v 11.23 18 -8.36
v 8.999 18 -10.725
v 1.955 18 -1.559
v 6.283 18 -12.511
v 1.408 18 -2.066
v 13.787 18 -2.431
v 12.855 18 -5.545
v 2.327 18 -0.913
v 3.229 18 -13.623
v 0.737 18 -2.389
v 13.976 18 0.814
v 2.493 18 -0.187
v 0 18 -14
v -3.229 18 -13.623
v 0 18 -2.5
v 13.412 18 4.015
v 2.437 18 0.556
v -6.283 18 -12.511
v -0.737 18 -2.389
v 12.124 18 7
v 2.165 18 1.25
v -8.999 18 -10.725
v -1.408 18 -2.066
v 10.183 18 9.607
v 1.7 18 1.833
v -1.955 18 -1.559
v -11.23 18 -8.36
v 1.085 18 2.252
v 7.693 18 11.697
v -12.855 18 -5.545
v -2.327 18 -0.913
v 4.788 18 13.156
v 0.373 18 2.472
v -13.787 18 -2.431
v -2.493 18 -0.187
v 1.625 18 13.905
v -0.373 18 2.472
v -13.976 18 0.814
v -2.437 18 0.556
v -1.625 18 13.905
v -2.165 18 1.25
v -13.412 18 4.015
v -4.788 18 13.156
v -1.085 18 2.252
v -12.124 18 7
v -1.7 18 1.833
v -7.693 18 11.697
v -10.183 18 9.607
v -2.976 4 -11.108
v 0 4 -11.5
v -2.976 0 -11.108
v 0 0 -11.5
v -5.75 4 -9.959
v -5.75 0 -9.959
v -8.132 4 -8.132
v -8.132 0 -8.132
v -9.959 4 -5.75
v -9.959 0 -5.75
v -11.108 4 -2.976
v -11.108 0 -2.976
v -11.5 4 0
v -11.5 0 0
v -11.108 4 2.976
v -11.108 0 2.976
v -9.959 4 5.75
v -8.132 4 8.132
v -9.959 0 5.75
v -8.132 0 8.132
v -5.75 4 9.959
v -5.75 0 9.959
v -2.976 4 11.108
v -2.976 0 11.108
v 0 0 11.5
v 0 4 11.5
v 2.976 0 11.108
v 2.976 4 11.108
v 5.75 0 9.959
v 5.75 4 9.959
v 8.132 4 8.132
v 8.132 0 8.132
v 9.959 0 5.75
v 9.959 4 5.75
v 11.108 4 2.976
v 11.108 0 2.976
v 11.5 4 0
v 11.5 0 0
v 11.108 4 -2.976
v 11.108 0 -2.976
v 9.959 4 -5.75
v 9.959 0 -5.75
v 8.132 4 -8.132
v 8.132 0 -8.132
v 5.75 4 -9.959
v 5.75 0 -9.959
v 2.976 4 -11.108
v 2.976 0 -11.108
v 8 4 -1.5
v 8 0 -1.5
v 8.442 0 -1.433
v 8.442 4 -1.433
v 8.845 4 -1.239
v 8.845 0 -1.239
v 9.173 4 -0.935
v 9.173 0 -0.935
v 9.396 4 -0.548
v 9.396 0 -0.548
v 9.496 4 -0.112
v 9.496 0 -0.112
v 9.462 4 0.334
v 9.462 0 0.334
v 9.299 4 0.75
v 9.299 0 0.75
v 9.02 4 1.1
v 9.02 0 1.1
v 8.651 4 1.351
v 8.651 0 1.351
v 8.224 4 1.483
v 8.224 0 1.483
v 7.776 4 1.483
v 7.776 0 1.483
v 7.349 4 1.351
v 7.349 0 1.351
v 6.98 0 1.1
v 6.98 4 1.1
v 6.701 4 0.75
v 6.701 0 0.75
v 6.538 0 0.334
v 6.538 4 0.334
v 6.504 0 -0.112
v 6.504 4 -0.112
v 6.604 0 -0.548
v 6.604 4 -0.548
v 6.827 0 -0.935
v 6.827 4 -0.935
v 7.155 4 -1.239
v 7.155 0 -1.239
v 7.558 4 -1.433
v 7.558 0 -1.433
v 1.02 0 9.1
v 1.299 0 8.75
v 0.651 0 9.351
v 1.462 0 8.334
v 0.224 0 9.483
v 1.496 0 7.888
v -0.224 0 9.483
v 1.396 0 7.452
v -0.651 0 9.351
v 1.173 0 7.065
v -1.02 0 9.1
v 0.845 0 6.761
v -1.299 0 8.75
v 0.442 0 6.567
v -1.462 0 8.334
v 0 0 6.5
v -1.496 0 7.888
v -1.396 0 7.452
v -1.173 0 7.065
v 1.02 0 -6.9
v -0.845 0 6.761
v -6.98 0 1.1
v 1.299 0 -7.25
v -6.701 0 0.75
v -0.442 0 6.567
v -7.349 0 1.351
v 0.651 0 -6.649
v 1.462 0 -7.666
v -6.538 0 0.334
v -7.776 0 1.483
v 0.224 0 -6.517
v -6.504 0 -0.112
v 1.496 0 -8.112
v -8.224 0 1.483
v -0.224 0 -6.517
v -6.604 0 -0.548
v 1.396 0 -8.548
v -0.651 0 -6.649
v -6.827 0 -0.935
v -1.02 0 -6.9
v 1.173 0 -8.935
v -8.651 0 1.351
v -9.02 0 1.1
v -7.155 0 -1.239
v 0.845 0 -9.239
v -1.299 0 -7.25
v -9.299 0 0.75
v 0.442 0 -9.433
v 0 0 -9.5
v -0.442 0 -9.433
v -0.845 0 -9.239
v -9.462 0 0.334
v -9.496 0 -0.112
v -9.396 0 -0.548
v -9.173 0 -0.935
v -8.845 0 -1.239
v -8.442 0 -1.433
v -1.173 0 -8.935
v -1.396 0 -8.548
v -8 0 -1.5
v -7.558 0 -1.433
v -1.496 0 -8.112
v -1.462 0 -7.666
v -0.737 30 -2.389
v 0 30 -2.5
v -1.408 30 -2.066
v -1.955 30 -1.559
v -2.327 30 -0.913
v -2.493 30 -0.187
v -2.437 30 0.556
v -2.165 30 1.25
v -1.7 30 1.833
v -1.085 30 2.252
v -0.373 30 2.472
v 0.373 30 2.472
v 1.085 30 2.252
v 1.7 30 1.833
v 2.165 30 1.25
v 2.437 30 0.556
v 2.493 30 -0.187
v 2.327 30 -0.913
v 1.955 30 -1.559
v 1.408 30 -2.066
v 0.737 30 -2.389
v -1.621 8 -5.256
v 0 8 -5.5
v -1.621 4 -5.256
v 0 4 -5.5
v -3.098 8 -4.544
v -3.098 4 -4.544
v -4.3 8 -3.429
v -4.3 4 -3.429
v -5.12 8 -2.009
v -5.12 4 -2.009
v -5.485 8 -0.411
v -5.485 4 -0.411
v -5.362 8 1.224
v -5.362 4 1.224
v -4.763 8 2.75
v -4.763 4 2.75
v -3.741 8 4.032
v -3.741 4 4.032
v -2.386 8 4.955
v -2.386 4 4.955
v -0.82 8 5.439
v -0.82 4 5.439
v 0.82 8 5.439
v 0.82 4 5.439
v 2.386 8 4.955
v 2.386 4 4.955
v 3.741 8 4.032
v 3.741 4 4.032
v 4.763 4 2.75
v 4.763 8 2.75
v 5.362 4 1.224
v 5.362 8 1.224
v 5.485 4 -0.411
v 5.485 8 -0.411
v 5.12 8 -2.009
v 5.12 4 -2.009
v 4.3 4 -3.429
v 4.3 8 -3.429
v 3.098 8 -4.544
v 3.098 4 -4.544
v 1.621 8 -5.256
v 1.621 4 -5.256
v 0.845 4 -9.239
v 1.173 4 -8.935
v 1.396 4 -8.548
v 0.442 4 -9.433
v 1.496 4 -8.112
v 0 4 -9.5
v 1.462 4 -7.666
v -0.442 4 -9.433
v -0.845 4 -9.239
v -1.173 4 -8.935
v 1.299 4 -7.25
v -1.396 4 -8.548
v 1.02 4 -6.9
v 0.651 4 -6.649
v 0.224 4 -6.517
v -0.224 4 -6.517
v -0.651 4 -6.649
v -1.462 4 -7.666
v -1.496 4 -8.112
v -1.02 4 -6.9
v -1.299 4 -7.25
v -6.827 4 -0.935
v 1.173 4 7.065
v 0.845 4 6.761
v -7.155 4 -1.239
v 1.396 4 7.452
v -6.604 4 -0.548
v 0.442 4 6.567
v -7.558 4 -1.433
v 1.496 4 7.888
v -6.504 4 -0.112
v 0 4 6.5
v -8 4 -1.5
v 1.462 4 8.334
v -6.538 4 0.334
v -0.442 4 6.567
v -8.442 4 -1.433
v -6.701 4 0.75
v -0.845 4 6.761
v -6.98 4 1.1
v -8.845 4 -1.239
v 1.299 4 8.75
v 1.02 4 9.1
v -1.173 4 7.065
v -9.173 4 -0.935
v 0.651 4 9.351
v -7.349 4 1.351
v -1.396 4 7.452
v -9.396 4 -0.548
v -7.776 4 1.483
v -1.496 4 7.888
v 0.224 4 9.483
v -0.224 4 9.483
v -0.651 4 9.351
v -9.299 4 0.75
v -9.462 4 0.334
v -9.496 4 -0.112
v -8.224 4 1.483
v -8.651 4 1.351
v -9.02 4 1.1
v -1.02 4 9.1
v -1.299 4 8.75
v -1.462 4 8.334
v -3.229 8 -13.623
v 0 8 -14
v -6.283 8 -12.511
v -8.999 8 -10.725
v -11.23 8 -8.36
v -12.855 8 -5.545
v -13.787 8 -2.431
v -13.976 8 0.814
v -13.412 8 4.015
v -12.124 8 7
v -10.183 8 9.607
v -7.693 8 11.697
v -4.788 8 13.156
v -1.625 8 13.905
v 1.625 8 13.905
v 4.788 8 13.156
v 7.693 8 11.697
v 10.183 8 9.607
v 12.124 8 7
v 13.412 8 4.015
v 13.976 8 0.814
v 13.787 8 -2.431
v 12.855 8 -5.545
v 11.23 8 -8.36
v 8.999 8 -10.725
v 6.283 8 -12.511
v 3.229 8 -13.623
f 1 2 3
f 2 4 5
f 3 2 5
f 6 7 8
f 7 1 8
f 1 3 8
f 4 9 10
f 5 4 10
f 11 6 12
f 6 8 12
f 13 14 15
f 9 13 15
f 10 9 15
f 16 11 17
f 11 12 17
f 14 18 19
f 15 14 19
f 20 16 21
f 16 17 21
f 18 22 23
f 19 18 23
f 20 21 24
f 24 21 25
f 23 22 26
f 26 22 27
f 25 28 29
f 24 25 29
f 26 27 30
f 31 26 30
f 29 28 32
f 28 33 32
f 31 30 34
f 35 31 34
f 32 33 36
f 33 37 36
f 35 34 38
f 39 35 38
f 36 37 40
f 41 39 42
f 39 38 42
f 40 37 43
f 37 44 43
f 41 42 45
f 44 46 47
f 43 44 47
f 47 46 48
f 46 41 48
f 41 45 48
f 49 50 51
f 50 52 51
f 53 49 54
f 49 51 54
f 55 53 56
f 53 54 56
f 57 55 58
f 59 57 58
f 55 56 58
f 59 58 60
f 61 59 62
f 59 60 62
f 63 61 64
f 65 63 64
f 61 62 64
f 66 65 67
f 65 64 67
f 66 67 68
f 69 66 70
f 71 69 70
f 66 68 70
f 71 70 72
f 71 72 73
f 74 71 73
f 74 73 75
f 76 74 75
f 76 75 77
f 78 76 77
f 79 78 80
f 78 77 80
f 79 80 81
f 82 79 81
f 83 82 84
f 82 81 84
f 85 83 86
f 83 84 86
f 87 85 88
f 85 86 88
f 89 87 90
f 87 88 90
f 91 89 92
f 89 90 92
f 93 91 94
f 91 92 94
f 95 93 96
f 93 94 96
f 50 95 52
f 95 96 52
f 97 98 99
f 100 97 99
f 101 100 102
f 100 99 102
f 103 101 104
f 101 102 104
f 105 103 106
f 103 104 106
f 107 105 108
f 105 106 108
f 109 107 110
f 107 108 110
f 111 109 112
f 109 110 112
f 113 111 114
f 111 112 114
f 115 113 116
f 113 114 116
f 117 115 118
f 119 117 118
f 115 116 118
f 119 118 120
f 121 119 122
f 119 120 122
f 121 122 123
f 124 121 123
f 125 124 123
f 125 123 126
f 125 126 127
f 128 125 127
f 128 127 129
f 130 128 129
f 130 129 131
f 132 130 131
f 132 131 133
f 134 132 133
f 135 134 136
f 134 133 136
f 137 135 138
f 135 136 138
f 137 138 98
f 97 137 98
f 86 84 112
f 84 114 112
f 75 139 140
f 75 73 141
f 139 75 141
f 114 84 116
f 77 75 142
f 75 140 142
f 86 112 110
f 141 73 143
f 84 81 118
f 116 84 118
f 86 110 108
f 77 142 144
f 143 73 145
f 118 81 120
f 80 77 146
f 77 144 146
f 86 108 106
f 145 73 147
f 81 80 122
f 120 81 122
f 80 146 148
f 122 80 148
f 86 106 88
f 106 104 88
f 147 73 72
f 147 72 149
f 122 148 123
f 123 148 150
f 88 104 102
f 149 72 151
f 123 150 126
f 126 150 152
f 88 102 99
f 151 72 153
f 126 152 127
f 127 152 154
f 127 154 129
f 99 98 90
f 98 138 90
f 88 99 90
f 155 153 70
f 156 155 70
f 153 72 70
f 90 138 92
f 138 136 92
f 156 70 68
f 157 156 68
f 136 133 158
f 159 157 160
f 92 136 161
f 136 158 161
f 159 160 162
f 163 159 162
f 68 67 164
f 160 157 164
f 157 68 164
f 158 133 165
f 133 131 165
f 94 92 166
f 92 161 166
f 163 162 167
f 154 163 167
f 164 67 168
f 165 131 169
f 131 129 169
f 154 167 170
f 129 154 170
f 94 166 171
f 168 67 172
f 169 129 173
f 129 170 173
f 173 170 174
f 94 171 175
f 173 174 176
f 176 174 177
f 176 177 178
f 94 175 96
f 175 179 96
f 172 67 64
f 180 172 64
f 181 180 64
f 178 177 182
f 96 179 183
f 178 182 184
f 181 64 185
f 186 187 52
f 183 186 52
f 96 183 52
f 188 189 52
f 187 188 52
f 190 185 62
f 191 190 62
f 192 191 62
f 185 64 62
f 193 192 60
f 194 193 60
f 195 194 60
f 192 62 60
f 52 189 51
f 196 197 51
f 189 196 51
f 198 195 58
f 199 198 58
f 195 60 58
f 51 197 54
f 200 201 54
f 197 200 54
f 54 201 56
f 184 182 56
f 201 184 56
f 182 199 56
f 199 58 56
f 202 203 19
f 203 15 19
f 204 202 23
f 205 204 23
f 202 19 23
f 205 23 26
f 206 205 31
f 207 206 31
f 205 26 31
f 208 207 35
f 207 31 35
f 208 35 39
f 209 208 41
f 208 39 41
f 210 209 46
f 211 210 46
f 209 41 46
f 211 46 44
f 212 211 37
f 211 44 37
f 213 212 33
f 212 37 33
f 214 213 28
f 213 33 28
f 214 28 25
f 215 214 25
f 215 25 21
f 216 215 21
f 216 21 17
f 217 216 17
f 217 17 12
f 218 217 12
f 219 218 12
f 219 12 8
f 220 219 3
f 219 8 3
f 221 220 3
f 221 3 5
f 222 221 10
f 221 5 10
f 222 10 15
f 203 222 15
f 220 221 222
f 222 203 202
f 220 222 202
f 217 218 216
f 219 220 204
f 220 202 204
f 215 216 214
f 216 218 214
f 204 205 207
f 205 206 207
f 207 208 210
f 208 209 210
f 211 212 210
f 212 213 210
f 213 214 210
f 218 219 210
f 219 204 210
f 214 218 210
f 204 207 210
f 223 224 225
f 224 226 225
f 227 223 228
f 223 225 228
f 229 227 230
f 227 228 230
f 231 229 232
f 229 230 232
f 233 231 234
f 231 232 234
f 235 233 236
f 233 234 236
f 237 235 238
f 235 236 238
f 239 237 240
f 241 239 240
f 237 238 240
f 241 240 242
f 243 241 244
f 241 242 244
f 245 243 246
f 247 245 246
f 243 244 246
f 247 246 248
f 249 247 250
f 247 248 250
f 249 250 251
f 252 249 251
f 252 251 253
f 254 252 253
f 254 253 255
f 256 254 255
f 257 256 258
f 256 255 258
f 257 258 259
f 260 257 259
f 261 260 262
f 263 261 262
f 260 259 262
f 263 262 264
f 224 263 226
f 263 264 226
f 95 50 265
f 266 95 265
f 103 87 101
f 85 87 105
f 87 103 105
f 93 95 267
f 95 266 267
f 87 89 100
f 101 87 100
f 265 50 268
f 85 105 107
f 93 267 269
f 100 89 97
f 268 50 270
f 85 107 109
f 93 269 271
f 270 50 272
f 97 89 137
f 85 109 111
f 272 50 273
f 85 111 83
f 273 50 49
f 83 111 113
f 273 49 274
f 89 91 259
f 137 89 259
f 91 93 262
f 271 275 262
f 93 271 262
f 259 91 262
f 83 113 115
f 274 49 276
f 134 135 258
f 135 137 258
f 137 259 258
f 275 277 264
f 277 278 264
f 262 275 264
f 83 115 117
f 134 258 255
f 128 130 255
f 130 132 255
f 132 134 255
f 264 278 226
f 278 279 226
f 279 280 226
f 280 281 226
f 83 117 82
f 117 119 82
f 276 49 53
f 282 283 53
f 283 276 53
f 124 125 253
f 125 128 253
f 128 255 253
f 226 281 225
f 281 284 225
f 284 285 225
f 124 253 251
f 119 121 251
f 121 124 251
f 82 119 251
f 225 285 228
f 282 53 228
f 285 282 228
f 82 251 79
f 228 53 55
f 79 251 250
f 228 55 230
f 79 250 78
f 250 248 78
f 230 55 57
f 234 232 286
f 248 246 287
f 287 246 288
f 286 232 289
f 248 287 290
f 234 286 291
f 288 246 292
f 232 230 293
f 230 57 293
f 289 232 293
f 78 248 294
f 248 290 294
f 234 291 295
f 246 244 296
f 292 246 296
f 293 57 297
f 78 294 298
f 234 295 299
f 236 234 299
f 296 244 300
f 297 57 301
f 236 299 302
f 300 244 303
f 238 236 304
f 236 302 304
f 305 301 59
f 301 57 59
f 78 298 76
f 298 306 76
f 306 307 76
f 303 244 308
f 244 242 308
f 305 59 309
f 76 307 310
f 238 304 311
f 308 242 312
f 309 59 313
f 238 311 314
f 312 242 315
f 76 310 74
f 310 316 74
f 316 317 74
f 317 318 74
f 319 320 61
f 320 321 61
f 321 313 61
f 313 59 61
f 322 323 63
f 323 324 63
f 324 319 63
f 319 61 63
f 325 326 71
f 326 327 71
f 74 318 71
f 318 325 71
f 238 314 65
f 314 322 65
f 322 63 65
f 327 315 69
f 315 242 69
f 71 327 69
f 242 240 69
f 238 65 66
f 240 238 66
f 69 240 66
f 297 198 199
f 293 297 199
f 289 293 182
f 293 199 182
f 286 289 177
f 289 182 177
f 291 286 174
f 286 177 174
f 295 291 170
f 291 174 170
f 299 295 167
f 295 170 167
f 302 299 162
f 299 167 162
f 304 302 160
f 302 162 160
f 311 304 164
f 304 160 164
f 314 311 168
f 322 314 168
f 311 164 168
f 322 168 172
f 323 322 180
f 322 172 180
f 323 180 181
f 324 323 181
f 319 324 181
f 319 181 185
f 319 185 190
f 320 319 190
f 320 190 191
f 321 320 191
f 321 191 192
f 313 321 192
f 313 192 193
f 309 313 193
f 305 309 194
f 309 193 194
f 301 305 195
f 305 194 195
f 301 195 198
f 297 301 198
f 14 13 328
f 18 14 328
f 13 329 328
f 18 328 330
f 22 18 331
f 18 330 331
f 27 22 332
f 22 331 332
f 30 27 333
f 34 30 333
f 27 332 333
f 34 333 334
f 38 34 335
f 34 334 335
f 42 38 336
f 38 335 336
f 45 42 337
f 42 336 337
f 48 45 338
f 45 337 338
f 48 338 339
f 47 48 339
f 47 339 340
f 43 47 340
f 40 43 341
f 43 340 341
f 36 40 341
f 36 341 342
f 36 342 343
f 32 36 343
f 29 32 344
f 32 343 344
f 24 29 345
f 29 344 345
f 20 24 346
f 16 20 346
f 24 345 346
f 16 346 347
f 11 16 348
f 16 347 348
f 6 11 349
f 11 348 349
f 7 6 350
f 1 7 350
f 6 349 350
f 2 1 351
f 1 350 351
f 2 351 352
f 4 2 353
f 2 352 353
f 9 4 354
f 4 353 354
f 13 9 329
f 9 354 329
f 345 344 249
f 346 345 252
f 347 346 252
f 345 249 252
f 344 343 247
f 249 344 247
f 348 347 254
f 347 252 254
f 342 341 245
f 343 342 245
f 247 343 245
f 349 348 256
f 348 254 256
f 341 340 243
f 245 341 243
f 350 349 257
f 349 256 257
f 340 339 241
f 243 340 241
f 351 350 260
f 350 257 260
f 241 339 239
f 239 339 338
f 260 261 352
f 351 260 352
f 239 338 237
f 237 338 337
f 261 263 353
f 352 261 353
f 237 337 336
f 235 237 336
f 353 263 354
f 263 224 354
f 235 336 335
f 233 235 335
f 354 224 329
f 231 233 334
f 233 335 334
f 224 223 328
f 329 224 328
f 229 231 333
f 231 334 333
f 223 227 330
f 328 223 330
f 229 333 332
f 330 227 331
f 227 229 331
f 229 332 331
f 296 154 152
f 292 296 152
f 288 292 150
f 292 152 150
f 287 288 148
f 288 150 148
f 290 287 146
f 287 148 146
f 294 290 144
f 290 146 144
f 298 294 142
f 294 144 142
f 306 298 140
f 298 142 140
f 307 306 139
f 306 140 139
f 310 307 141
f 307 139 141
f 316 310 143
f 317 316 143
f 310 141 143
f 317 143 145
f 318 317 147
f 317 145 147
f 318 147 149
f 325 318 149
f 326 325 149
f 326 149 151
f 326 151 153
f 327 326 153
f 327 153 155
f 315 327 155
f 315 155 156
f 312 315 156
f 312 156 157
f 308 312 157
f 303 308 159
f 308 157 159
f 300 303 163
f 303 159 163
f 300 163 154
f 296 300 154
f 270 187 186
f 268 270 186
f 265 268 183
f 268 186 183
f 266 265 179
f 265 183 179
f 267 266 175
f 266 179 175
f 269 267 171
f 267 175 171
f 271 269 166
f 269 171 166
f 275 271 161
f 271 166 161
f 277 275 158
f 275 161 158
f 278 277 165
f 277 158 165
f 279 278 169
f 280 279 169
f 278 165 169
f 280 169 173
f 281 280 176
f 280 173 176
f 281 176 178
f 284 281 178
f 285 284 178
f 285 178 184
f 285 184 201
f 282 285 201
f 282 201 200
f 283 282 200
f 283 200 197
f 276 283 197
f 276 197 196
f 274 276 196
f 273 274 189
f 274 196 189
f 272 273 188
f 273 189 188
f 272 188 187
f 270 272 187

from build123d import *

# Parameters (mm, degrees)
SKETCH2_R          = 1.5
CUT_EXTRUDE1_DEPTH = 4


with BuildPart() as part:
    # Sketch1 → Revolve1 (revolve)
    with BuildSketch(Plane.XY, mode=Mode.PRIVATE) as revolve1_sk:
        Polygon((0, 30), (2.5, 30), (2.5, 18), (14, 18), (14, 8), (5.5, 8), (5.5, 4), (11.5, 4), (11.5, 0), (0, 0), align=None)
    revolve(revolve1_sk.sketch.rotate(Axis((0, 0, 0), (0, 1, 0)), 90), axis=Axis((0, 0, 0), (0, 1, 0)))

    # Sketch2 → Cut-Extrude1 (cut)
    with BuildSketch(Plane.XZ):
        with Locations(Location((0, 8, 0), (0, 0, 270))):
            Circle(SKETCH2_R)
        with Locations(Location((8, 0, 0), (0, 0, 270))):
            Circle(SKETCH2_R)
        with Locations(Location((0, -8, 0), (0, 0, 270))):
            Circle(SKETCH2_R)
        with Locations(Location((-8, 0, 0), (0, 0, 270))):
            Circle(SKETCH2_R)
    extrude(amount=-CUT_EXTRUDE1_DEPTH, mode=Mode.SUBTRACT)


solid = part.part
